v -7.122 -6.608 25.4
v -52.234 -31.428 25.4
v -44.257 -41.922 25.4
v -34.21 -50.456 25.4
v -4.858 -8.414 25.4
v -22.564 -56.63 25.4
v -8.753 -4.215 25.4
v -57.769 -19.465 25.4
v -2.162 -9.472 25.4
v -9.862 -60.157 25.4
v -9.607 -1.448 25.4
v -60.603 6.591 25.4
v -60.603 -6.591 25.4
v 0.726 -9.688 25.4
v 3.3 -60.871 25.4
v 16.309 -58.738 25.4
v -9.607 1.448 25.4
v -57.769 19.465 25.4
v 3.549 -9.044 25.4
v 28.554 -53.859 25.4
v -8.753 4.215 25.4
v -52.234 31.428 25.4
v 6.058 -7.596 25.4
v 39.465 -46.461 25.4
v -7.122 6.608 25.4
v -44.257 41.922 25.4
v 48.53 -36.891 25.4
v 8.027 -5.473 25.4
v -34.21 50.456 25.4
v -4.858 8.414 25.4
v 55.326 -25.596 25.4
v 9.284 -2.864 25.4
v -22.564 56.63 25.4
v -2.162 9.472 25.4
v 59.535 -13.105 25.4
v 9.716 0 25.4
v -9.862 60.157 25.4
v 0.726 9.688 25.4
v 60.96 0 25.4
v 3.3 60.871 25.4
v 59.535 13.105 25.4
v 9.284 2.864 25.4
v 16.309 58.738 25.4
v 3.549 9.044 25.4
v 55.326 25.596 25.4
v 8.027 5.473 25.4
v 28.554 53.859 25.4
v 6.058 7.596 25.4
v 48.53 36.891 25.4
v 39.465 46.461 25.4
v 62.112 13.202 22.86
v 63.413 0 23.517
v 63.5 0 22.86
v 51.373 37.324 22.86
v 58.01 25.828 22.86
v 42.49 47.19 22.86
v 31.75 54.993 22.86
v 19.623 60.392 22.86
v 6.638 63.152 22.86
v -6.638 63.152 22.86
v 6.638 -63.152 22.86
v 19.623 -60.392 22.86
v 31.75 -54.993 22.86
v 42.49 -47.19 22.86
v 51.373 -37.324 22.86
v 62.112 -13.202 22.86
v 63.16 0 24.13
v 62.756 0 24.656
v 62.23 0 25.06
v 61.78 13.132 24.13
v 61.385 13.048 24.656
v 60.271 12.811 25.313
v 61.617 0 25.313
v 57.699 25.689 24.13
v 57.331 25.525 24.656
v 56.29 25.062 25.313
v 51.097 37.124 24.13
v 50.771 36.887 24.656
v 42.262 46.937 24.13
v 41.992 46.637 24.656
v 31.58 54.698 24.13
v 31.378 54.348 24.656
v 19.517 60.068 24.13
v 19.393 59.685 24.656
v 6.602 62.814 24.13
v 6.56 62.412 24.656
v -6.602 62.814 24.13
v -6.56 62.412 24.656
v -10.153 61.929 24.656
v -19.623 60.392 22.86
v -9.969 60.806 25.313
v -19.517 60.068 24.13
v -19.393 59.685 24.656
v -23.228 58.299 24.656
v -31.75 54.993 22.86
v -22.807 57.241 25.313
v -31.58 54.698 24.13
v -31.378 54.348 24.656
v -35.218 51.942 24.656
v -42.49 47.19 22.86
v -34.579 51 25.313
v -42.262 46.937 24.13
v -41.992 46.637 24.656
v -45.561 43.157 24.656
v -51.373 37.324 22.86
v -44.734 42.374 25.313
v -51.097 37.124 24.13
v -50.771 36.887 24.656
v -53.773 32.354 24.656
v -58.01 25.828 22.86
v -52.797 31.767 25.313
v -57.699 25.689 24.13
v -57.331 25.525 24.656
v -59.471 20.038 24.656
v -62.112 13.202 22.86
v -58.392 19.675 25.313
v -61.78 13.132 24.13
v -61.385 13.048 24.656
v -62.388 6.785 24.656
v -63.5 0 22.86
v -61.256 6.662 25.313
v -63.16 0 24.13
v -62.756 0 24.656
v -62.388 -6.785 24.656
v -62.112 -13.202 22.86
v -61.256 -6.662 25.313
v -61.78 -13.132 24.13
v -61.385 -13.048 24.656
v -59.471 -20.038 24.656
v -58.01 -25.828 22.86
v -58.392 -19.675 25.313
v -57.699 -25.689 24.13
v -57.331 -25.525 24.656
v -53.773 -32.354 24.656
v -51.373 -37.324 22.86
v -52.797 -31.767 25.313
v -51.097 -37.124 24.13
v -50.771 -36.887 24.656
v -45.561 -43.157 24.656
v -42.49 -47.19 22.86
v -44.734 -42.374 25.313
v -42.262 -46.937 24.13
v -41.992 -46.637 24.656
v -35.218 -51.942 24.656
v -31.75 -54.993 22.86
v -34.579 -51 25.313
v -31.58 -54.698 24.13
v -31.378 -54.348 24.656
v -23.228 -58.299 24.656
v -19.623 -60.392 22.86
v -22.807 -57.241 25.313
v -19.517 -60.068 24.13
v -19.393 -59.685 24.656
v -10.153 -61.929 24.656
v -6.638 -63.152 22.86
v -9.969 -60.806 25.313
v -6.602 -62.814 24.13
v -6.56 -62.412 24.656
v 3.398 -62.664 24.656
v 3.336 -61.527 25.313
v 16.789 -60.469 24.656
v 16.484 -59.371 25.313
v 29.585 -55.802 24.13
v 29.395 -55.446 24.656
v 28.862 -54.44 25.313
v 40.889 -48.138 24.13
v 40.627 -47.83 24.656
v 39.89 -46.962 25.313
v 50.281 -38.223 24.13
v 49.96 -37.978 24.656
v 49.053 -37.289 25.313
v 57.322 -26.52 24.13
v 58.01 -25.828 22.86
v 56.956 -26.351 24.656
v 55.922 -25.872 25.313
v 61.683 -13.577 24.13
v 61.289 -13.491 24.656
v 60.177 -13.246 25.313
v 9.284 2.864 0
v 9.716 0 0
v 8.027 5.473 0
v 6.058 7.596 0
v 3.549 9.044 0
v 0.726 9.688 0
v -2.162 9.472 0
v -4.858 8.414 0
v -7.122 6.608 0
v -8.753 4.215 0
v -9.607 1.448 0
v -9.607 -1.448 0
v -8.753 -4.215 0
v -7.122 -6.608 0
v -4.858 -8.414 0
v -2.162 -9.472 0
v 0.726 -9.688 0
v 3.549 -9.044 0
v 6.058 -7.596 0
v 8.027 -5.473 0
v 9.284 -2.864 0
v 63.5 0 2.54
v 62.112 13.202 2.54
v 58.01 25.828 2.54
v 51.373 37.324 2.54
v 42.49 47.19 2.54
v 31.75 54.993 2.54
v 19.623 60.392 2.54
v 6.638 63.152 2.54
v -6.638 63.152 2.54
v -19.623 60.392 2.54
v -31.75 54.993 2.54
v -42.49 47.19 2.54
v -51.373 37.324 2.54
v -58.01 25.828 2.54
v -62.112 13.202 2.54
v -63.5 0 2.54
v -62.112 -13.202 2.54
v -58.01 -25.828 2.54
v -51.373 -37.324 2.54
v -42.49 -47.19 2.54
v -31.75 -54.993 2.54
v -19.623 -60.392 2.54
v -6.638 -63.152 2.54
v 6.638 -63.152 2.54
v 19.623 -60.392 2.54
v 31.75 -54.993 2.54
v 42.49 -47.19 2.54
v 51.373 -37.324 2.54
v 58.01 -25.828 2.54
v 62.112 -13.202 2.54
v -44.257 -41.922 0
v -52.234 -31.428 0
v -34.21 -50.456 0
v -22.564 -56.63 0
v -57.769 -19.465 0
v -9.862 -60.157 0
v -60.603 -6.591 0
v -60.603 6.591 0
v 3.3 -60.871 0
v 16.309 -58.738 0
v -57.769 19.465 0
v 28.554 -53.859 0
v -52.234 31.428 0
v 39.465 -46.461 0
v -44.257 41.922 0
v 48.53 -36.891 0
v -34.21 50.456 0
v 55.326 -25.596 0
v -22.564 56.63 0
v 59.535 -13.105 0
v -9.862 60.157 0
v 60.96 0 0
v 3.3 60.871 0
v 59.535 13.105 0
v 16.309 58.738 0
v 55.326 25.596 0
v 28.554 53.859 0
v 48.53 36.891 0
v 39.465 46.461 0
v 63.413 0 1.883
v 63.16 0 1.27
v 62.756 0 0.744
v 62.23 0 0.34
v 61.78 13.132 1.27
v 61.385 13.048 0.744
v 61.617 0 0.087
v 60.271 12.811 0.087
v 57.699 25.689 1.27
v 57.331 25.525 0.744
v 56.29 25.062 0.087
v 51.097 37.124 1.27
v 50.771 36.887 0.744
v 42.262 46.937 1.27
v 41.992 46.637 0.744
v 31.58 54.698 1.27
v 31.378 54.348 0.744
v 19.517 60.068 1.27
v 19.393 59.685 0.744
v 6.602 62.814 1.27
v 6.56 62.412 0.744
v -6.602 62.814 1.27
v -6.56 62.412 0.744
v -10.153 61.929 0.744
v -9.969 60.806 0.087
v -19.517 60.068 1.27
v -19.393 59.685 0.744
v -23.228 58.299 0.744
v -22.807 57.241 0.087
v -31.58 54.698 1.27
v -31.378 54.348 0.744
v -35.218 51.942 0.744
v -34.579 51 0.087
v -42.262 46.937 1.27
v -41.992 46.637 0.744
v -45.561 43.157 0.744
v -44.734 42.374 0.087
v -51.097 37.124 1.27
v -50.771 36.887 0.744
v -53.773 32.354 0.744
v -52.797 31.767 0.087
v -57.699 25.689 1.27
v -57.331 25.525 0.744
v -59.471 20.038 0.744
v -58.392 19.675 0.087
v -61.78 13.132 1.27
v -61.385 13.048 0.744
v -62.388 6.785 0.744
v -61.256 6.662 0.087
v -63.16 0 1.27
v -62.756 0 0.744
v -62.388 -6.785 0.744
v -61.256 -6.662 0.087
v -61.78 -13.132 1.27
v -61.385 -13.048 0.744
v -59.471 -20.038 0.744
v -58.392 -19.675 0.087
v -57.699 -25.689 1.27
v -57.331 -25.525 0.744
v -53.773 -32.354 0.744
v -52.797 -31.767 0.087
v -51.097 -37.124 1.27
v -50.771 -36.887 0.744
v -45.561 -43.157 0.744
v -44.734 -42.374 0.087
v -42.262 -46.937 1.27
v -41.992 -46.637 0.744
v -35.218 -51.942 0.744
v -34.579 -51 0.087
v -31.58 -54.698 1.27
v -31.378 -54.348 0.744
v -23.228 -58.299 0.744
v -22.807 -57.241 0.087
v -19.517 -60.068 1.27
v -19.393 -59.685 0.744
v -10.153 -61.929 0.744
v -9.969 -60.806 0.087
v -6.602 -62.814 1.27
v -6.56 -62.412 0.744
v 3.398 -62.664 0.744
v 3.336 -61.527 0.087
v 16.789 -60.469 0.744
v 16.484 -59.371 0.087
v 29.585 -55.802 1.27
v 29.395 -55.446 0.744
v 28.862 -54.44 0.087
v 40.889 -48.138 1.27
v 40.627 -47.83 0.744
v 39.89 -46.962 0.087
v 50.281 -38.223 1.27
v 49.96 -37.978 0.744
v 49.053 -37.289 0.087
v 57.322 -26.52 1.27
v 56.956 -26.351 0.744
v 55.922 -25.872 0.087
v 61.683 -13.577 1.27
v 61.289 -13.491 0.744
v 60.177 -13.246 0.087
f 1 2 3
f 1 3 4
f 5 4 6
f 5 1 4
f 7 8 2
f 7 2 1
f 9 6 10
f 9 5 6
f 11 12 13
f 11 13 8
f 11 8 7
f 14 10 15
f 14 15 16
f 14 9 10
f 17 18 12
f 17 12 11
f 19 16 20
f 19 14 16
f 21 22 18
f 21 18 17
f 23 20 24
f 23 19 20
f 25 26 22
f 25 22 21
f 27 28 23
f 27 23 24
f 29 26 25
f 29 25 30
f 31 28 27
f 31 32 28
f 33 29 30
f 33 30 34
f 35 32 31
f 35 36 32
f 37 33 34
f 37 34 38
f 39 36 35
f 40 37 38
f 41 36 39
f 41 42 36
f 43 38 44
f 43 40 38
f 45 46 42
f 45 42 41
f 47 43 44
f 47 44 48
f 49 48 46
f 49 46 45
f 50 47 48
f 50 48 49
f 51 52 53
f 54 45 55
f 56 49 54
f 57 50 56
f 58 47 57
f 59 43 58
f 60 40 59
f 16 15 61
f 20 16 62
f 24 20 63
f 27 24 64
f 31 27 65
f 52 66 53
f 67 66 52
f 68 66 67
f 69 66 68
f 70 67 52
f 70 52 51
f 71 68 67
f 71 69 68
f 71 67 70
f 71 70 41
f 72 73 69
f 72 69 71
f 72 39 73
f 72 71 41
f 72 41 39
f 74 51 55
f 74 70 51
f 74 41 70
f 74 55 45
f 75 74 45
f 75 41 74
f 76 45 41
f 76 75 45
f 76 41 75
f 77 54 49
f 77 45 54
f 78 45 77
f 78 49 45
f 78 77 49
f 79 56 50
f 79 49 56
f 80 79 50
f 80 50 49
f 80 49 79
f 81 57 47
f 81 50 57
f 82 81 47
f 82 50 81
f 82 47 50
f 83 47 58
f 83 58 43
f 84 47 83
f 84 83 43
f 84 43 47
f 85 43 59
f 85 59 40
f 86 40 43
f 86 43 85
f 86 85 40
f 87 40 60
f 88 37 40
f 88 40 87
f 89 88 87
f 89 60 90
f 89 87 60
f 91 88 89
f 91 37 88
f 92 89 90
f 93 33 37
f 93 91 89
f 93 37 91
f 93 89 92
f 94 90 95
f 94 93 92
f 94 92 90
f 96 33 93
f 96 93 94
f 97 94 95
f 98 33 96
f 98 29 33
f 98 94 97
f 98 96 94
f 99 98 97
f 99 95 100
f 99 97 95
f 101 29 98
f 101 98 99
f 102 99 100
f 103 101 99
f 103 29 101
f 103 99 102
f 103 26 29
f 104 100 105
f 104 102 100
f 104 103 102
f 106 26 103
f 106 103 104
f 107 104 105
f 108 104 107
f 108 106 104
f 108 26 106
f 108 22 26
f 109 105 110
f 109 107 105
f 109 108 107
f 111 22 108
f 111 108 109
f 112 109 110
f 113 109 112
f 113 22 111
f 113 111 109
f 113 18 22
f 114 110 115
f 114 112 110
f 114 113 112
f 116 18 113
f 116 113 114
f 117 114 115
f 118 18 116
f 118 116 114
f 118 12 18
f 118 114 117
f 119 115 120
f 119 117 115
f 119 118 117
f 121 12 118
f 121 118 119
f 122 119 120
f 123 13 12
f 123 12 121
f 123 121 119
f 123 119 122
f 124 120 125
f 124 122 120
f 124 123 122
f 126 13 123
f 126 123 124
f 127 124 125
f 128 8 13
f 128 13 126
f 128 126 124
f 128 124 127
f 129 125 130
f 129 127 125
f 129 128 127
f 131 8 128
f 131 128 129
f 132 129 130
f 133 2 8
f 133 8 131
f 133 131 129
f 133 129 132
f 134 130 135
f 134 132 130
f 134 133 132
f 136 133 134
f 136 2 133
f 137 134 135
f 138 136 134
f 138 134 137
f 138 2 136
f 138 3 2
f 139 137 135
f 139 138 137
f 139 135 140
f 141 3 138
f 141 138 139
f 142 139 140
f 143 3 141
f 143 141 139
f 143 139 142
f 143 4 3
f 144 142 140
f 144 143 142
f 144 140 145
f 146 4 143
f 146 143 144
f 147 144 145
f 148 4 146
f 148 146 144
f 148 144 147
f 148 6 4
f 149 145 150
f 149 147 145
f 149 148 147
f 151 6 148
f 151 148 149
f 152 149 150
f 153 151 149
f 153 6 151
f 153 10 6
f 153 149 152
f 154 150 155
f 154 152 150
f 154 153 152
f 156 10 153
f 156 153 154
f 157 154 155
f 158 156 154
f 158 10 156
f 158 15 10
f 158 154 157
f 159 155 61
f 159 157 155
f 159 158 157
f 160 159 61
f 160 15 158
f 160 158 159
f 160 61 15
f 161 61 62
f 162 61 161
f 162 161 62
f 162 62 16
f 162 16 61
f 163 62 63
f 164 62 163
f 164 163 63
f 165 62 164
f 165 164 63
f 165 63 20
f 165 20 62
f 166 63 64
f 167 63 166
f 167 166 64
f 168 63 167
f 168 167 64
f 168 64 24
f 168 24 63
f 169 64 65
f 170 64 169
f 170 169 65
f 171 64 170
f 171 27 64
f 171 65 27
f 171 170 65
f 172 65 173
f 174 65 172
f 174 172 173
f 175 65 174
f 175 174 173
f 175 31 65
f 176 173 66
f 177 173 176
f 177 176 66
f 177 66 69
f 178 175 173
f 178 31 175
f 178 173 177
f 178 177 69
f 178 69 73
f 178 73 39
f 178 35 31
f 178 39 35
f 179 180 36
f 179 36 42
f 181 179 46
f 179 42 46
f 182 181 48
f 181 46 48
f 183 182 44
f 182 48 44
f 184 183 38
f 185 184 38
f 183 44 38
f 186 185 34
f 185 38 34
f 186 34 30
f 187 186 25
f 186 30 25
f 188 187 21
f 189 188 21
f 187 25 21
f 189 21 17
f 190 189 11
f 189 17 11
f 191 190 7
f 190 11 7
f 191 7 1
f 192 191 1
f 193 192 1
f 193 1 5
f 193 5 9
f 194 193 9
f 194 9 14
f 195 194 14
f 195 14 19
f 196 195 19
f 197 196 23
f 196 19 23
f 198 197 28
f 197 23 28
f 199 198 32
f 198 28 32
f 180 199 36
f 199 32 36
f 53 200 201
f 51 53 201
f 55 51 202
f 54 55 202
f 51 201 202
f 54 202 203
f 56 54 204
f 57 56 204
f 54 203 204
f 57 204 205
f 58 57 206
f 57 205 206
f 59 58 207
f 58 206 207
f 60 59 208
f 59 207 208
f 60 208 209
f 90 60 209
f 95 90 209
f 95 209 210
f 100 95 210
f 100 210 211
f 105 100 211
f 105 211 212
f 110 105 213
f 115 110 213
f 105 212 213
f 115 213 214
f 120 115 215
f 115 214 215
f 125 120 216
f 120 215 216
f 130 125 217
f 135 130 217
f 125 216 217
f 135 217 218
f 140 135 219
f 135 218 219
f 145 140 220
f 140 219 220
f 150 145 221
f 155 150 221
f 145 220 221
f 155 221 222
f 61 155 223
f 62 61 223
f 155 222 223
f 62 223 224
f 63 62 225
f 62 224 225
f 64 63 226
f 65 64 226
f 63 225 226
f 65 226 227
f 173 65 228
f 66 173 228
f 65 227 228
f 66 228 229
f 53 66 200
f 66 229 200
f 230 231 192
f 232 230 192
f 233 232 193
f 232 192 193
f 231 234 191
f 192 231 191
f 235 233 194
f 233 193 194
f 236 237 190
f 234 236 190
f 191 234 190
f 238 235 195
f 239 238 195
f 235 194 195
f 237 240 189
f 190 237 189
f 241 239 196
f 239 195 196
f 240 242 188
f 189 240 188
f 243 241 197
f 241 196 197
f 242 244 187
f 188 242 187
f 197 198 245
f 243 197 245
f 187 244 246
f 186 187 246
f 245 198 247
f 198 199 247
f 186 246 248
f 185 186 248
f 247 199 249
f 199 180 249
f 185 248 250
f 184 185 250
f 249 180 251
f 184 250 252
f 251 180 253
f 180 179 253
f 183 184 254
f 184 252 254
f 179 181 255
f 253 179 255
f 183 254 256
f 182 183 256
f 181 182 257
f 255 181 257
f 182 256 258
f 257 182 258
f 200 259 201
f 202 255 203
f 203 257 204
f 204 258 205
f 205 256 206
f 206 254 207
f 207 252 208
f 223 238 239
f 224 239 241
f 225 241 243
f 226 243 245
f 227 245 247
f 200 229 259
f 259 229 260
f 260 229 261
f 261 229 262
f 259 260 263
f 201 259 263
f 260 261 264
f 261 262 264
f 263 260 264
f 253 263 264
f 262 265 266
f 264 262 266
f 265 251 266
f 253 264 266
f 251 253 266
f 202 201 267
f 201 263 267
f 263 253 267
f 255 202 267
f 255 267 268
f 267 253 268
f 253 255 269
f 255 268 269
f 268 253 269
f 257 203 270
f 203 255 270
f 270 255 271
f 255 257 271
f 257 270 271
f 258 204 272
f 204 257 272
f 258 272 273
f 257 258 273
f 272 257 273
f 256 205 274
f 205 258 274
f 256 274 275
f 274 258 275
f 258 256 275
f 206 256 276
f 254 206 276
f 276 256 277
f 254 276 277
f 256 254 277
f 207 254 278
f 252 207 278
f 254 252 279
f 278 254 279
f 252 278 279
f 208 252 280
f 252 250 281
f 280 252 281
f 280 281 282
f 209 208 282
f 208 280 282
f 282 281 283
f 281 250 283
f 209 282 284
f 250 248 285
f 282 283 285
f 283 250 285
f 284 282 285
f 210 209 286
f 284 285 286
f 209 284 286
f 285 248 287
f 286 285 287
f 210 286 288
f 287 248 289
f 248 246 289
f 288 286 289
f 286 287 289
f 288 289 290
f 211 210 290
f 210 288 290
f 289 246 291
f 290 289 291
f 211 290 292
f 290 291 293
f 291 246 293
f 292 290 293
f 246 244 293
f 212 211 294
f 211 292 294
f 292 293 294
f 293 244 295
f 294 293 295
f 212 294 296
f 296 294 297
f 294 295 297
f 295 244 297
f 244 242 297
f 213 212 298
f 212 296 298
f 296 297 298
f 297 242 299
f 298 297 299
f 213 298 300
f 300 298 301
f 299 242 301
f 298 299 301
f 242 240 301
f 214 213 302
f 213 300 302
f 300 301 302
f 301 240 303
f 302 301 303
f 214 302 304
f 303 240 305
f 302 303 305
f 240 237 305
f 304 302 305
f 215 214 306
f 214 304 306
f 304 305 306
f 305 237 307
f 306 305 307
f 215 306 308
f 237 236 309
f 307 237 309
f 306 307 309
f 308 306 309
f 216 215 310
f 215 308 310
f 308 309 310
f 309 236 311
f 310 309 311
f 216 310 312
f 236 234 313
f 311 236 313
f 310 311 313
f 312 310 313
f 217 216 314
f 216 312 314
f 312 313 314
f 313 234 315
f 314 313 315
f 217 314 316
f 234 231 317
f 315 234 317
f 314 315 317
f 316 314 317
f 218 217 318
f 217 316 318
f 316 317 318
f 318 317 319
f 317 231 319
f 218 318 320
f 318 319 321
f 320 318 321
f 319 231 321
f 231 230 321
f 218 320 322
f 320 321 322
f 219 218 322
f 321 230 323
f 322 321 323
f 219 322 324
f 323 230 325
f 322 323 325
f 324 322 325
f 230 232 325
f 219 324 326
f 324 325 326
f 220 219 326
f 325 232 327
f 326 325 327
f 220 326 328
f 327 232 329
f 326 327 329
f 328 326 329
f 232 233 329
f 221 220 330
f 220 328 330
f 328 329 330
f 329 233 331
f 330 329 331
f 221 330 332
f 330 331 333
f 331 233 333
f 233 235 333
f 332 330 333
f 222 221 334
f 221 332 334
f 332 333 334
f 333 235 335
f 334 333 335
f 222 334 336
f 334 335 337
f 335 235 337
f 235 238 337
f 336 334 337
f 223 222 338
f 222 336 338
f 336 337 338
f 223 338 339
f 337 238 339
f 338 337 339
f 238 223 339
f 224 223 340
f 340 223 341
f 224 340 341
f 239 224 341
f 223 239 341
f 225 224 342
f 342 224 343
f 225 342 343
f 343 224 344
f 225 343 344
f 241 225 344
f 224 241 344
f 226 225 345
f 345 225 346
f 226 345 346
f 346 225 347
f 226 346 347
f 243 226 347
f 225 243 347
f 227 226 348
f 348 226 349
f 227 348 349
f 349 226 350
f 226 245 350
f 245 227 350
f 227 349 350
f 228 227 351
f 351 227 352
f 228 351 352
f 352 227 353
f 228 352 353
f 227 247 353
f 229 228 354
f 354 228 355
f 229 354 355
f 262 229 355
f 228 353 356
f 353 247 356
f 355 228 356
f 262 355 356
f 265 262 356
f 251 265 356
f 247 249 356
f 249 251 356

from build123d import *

# Parameters (mm, degrees)
F0_R     = 63.5
F0_R_2   = 4.1275
F1_DEPTH = 25.4
F2_R     = 2.54
F3_R     = 9.7155
F4_DEPTH = 406.4


with BuildPart() as f1:
    # F0 (on Top) → F1 (new body)
    with BuildSketch(Plane.XY):
        Circle(F0_R)
        Circle(F0_R_2, mode=Mode.SUBTRACT)
    extrude(amount=F1_DEPTH)

    # F2
    f2_edges = [f1.edges().sort_by_distance(p)[0] for p in [
        (-63.5, 0, 25.4),
        (-63.5, 0, 0),
    ]]
    fillet(f2_edges, radius=F2_R)

    # F3 (on Top) → F4 (cut, symmetric)
    with BuildSketch(Plane.XY):
        Circle(F3_R)
    extrude(amount=F4_DEPTH, both=True, mode=Mode.SUBTRACT)


solid = f1.part
